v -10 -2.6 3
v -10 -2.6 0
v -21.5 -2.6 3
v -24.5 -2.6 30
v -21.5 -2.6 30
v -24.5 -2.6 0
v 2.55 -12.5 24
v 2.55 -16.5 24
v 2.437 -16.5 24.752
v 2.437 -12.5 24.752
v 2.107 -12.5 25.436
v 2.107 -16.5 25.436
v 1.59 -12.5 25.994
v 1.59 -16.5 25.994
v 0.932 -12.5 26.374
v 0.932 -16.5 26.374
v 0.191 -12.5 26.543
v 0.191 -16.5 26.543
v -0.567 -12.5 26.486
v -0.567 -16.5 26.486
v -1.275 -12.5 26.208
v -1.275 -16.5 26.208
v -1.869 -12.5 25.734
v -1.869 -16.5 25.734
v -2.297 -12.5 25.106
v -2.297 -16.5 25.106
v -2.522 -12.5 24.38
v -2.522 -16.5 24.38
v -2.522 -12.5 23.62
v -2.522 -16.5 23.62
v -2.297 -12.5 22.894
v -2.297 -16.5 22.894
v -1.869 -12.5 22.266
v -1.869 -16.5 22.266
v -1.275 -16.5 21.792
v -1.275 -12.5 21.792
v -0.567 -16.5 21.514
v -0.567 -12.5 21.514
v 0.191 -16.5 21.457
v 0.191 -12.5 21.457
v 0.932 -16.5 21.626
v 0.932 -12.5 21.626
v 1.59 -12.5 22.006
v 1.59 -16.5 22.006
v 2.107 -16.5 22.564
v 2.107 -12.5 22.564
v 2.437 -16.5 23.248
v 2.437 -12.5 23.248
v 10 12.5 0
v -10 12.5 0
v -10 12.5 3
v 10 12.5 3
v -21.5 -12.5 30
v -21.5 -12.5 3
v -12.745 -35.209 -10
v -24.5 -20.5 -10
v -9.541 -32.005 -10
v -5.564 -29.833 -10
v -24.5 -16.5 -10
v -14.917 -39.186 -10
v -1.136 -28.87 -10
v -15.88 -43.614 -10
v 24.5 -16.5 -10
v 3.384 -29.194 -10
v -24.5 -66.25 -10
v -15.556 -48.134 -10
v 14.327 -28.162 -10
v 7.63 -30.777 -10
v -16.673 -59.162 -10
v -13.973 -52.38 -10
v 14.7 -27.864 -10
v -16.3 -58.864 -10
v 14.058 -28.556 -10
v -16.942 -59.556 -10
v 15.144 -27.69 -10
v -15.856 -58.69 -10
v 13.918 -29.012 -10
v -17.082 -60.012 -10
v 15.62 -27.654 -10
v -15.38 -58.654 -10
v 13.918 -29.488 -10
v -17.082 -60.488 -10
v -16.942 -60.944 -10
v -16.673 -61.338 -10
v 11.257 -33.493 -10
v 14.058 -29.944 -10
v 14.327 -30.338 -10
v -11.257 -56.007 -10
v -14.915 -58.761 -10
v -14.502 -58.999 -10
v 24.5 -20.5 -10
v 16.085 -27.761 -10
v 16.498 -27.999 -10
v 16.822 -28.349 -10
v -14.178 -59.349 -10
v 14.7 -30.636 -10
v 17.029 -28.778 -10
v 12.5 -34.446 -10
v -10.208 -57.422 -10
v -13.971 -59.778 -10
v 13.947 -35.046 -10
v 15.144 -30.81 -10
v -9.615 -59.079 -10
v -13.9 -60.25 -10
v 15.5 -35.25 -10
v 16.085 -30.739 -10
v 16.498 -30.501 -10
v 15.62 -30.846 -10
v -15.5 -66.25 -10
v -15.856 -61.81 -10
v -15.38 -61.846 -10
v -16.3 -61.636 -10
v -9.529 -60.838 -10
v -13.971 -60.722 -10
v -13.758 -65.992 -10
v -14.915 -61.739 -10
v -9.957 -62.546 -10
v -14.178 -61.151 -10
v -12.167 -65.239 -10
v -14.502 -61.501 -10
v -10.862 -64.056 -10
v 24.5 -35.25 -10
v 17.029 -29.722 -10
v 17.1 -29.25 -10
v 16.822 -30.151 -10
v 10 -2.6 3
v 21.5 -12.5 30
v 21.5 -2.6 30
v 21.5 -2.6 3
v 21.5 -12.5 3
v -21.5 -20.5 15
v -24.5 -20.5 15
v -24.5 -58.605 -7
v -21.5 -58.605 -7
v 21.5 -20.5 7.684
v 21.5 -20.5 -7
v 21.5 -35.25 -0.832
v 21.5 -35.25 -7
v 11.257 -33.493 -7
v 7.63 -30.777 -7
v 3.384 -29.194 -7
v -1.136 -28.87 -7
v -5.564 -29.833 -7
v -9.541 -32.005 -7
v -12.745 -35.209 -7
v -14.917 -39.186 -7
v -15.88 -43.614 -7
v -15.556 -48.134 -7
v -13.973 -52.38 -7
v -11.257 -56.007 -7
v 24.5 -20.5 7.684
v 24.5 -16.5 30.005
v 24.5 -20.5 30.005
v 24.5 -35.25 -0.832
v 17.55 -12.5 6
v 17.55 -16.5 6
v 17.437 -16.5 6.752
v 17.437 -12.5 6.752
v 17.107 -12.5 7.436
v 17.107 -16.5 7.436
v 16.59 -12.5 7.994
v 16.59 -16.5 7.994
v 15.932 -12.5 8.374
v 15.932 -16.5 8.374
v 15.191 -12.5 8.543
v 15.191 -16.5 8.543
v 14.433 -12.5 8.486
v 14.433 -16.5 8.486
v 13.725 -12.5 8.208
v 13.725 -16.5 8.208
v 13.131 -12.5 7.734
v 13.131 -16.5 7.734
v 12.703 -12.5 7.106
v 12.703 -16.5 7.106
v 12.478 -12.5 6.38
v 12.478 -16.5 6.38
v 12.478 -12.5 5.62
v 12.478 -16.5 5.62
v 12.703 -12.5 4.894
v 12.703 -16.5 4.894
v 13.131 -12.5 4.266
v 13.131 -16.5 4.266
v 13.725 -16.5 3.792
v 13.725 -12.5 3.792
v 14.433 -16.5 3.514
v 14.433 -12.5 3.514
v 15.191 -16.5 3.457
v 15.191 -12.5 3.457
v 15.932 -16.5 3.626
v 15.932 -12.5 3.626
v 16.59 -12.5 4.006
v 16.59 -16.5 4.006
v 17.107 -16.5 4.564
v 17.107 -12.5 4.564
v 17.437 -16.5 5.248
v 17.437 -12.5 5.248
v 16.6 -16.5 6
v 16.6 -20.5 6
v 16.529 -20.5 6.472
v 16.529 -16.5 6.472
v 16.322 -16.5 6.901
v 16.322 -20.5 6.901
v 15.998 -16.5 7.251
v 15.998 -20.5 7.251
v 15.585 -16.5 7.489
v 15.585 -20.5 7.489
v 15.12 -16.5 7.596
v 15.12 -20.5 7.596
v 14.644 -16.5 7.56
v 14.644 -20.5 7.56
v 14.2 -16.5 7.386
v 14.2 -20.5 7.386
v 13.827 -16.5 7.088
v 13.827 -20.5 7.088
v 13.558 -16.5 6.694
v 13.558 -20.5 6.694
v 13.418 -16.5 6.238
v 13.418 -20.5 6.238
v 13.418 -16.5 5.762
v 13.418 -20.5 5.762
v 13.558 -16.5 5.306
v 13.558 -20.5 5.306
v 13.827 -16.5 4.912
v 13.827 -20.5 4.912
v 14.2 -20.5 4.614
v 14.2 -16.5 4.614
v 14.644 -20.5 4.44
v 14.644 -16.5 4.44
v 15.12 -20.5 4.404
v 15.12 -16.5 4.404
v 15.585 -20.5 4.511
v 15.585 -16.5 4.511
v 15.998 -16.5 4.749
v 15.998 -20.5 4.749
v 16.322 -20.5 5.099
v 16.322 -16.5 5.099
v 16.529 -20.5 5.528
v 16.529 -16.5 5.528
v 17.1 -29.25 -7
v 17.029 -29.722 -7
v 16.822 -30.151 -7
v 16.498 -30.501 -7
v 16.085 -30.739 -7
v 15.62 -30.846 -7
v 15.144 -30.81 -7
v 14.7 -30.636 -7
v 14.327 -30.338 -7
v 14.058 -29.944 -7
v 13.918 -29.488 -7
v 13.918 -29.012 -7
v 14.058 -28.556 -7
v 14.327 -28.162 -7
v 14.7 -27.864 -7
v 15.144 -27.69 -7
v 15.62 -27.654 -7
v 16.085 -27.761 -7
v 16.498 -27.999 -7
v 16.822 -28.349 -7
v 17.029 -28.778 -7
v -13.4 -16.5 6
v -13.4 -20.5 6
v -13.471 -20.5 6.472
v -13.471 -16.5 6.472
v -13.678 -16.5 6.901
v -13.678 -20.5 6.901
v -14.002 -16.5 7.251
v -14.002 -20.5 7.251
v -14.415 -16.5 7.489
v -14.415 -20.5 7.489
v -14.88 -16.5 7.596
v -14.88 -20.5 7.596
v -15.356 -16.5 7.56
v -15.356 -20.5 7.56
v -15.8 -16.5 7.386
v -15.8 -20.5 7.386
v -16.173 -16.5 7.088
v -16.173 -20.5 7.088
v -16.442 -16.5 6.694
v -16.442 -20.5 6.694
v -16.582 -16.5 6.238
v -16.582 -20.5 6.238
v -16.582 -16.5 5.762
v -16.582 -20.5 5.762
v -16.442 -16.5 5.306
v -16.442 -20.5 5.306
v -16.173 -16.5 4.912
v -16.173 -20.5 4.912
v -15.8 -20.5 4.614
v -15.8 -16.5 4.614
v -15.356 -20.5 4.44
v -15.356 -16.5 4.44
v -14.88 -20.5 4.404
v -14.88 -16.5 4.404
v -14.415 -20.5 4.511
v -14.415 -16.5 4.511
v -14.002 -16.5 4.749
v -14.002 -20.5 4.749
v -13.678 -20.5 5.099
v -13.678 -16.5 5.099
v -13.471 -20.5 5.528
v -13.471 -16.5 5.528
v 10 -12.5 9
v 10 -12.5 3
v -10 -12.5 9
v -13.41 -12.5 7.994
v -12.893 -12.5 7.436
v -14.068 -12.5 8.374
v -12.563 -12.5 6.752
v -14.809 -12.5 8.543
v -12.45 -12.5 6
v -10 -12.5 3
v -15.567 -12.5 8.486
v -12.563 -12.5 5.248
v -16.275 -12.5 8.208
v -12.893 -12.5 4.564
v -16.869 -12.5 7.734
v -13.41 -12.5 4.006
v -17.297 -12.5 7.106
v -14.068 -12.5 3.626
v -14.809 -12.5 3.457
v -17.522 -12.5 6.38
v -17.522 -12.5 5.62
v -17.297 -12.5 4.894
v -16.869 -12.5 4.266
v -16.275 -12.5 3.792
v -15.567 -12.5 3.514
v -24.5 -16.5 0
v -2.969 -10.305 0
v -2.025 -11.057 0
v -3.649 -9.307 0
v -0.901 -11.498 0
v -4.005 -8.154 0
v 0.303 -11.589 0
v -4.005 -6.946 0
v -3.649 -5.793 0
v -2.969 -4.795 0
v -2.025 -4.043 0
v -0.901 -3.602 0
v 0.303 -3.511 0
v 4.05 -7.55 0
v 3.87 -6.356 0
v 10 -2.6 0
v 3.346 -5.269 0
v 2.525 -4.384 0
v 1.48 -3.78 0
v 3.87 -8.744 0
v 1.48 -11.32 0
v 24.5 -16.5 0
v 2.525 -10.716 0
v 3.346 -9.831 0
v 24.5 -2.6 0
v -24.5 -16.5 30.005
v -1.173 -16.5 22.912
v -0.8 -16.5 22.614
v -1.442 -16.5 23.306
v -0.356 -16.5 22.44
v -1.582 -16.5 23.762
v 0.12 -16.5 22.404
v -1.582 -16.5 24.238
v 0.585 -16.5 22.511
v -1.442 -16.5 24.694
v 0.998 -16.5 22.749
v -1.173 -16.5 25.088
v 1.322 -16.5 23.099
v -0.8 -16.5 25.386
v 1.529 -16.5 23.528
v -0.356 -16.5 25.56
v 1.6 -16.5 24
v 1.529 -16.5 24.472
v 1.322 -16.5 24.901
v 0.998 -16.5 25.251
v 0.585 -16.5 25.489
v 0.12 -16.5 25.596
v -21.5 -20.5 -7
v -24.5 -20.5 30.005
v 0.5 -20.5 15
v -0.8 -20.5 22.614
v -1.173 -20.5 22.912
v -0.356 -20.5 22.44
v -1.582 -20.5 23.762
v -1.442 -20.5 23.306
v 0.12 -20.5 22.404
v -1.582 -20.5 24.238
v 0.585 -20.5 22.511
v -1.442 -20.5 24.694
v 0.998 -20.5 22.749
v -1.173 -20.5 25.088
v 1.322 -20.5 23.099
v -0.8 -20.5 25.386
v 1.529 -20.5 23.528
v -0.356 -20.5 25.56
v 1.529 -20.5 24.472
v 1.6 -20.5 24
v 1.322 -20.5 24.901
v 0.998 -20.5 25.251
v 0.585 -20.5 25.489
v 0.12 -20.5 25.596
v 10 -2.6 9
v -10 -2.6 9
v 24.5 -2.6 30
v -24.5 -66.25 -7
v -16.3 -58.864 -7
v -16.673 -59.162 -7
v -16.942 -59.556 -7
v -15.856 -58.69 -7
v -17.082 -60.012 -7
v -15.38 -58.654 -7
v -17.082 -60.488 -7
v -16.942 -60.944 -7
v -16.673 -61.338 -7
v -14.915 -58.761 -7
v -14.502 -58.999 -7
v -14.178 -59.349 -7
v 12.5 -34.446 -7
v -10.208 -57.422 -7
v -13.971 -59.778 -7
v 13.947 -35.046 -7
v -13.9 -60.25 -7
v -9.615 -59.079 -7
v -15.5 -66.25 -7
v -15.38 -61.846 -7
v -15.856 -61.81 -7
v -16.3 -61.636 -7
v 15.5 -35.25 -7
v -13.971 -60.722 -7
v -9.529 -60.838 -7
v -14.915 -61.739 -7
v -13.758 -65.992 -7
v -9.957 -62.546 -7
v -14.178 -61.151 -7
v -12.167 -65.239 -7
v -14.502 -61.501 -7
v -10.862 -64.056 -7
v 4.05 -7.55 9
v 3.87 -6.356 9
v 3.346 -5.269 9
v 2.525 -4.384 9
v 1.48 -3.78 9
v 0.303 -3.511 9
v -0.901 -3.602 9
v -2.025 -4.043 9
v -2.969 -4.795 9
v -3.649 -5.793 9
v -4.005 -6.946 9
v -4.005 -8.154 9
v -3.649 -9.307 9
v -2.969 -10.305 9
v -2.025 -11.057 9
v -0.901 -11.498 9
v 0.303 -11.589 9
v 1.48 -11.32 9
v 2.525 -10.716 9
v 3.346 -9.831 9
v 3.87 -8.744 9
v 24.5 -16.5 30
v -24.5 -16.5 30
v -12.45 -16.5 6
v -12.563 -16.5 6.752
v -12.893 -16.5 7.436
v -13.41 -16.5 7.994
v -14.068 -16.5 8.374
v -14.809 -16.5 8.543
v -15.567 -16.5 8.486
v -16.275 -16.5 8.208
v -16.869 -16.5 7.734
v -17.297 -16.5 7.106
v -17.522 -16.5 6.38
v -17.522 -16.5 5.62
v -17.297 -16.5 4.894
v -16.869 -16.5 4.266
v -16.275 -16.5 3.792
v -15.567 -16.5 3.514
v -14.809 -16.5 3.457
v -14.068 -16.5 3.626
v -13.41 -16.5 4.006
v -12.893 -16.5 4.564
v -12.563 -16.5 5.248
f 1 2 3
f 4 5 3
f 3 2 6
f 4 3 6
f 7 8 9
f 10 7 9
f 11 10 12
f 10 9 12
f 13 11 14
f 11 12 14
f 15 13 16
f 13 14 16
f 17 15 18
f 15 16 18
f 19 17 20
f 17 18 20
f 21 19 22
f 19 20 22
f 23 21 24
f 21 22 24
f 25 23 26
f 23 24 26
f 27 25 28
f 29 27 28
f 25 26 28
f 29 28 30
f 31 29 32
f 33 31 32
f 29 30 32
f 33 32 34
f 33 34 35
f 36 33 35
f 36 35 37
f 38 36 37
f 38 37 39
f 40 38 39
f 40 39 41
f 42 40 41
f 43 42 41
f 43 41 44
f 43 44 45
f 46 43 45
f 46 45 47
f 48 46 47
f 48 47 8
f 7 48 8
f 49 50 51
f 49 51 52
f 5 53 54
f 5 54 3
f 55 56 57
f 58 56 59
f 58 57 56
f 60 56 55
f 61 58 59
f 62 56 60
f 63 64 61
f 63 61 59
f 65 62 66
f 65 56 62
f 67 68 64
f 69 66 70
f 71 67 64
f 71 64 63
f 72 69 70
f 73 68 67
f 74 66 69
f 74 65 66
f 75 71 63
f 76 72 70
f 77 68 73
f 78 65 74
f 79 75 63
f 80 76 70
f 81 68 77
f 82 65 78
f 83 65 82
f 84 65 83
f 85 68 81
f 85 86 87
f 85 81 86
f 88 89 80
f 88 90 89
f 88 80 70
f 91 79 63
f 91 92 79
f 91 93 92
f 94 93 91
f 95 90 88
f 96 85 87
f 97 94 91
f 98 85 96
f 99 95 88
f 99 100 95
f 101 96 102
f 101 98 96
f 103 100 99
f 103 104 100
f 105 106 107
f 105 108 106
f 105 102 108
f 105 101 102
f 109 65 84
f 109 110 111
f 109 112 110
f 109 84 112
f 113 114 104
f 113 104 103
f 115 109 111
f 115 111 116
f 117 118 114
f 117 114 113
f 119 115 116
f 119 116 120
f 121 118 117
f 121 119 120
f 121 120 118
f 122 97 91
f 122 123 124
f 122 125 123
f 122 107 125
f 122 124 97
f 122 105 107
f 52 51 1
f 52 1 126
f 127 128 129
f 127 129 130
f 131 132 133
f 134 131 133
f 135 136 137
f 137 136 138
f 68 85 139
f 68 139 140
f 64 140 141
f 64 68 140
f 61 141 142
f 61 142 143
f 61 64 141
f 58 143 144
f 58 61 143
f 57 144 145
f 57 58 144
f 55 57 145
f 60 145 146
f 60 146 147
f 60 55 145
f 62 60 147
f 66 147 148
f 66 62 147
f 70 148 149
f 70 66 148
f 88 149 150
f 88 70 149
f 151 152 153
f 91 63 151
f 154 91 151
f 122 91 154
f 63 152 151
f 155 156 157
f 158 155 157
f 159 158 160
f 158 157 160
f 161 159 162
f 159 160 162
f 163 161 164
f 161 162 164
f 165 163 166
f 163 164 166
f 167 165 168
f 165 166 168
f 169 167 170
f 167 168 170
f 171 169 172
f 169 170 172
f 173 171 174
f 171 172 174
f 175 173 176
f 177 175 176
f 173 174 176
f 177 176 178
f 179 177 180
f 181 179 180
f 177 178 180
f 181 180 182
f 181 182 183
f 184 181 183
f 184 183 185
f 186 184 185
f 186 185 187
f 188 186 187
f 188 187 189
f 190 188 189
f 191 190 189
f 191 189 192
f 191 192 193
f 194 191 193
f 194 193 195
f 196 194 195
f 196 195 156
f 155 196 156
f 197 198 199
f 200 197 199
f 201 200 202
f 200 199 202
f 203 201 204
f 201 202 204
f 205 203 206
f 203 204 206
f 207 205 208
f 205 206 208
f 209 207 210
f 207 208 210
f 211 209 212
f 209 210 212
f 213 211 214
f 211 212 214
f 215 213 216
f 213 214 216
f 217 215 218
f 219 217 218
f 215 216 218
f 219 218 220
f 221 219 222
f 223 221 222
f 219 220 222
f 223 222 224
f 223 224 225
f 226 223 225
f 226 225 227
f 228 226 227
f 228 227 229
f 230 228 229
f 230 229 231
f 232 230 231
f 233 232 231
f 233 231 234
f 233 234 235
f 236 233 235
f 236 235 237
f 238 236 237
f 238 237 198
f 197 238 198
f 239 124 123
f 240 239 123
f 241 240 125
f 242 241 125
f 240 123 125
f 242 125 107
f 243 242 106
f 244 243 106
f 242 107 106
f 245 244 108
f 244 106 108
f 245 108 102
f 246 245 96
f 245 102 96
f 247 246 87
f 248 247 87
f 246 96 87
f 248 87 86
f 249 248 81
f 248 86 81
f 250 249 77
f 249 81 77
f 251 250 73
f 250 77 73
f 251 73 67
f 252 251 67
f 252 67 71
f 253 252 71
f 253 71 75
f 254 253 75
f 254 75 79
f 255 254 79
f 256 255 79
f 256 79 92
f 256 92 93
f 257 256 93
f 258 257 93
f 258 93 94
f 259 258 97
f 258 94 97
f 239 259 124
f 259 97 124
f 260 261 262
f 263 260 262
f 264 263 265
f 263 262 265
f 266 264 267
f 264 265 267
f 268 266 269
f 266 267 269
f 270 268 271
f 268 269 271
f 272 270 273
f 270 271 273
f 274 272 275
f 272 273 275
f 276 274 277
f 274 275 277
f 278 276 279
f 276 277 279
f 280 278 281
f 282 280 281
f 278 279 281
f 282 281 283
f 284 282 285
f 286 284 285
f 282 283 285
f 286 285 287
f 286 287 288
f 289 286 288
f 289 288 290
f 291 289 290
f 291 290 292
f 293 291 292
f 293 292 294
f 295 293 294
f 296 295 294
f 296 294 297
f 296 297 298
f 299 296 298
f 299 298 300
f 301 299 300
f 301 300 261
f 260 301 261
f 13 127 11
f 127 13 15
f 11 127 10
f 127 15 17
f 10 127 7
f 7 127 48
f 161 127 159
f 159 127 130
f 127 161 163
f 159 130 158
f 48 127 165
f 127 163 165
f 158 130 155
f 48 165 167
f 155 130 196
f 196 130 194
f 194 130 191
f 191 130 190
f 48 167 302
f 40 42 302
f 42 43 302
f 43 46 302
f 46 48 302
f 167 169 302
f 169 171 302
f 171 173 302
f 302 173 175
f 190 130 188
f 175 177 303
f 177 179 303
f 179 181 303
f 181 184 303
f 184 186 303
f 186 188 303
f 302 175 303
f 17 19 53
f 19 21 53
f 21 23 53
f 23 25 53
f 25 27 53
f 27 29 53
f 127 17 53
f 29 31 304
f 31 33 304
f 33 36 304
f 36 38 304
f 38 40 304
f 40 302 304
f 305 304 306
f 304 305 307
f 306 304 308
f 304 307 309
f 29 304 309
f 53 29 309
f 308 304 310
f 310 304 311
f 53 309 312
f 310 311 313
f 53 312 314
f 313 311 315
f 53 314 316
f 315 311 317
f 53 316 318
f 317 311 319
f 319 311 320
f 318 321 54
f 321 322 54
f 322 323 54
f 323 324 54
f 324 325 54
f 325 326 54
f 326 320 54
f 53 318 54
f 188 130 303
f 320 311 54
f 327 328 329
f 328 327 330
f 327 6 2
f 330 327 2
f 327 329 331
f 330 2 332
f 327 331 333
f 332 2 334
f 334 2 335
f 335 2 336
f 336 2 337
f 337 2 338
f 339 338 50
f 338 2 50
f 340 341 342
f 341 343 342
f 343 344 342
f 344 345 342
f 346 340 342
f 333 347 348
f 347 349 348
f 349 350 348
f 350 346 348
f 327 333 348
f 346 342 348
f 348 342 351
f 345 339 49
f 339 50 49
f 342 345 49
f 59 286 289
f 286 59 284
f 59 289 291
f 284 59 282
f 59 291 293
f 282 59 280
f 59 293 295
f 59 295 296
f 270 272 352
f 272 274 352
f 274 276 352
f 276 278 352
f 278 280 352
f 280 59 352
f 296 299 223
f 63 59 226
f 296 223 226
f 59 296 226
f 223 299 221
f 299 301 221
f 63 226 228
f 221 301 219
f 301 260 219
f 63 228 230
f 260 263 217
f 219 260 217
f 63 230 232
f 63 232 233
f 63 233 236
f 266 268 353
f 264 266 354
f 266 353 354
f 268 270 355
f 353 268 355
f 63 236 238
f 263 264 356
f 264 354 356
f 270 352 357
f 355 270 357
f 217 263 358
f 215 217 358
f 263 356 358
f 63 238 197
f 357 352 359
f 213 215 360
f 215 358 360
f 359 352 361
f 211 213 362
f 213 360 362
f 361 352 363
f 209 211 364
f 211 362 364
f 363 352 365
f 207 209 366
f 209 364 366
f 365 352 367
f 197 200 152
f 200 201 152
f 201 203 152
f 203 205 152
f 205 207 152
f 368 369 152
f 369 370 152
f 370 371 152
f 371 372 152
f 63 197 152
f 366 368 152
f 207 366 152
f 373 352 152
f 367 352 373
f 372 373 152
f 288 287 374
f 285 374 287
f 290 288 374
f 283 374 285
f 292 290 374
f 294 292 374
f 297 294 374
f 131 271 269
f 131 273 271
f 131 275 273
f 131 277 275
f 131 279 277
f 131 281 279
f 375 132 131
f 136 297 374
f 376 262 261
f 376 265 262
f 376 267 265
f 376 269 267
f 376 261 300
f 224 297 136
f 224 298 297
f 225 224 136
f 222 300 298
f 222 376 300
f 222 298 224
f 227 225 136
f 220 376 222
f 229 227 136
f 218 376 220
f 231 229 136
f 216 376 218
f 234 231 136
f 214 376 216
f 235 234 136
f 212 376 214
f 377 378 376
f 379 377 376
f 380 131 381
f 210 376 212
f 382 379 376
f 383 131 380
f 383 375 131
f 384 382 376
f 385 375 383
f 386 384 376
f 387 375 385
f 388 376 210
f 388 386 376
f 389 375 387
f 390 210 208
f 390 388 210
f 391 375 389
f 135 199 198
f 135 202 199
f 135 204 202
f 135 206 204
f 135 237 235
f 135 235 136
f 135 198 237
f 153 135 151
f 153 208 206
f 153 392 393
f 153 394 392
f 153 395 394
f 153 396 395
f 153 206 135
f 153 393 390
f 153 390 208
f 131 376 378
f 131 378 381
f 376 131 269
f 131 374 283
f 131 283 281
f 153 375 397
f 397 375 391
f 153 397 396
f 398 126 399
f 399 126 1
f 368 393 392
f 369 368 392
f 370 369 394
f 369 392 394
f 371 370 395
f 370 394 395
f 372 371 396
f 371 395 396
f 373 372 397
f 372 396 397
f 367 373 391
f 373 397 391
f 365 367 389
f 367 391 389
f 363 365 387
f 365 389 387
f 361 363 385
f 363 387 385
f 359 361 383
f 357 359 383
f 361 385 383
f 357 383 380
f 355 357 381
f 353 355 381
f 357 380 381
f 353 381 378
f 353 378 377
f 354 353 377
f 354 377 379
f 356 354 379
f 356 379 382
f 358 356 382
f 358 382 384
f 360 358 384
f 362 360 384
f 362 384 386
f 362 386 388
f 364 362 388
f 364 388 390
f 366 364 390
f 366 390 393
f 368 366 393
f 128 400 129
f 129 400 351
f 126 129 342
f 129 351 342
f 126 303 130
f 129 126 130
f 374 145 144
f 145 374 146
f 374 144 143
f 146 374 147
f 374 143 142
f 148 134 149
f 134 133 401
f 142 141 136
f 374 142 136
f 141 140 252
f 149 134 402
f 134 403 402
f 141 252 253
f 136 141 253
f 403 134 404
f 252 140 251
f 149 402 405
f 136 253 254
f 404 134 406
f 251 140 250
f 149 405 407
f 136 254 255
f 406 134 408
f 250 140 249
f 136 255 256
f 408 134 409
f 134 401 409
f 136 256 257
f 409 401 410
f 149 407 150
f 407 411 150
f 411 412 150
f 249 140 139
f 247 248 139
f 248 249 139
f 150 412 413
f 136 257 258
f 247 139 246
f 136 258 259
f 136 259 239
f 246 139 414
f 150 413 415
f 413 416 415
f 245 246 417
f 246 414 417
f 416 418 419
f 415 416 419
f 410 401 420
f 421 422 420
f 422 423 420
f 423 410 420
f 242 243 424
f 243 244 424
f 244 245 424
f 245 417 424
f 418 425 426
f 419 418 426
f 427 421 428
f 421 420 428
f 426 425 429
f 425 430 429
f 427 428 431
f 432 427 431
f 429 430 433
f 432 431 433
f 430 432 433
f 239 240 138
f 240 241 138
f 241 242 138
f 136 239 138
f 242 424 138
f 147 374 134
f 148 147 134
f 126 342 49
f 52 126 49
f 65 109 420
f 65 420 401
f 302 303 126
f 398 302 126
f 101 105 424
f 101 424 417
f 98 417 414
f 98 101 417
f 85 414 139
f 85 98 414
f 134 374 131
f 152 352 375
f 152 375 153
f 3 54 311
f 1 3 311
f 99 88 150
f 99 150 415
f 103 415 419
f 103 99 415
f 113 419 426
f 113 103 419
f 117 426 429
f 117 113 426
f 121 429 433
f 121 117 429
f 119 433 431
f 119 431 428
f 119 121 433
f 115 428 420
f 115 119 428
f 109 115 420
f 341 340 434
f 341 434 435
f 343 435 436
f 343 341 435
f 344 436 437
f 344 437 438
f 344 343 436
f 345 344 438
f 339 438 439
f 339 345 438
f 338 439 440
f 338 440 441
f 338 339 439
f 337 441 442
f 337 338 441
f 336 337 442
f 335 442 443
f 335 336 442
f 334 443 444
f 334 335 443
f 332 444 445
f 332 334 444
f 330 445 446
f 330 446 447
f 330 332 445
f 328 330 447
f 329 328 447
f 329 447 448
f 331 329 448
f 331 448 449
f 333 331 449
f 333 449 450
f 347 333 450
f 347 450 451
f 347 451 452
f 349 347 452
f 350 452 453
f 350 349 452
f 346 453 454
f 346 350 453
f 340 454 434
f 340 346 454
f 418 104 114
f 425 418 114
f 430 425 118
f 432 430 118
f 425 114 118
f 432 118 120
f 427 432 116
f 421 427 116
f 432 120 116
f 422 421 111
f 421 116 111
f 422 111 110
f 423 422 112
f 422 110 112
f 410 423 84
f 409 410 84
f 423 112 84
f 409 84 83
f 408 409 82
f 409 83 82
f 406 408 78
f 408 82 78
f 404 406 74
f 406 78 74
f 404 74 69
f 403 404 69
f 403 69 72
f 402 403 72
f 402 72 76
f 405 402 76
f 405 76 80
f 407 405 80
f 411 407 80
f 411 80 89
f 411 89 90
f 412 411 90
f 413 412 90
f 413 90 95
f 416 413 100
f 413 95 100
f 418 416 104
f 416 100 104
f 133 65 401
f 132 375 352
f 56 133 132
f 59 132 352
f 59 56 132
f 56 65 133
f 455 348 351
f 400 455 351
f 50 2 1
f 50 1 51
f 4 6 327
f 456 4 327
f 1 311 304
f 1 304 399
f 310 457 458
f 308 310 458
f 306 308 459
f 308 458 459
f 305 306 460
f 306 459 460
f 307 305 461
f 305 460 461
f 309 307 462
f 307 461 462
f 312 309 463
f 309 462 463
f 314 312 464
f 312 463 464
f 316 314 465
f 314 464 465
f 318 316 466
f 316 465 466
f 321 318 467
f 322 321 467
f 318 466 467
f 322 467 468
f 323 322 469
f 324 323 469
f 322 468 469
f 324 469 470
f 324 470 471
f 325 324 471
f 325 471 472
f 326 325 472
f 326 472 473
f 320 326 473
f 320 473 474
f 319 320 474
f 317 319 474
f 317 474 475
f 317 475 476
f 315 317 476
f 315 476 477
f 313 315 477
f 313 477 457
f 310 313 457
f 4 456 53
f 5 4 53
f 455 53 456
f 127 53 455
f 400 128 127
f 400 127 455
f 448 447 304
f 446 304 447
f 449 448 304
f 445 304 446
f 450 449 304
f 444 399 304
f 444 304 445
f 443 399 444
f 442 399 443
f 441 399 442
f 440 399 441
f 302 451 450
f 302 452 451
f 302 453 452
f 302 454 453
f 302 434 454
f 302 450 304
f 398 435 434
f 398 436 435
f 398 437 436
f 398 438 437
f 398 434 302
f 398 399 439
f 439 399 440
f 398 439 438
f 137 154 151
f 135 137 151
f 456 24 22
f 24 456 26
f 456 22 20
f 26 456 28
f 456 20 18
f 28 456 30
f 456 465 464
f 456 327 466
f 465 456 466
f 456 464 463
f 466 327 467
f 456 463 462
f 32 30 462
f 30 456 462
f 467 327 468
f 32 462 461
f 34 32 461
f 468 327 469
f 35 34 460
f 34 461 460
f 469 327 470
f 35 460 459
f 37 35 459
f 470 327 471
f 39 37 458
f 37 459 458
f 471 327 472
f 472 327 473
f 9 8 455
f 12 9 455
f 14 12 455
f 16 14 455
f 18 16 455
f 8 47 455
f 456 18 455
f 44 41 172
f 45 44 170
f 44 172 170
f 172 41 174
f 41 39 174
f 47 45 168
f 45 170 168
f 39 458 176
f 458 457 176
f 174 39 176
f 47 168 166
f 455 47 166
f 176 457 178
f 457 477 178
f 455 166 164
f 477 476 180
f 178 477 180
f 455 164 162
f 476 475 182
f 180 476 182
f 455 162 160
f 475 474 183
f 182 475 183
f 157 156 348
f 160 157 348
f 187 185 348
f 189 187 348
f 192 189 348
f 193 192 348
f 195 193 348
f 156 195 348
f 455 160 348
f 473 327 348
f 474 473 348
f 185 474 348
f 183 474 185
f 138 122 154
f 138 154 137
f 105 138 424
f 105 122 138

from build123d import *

# Parameters (mm, degrees)
F0_W      = 20
F0_H      = 25
F1_DEPTH  = 3
F3_DEPTH  = 9
F5_DEPTH  = 30
F6_W      = 49
F6_H      = 13.9
F7_DEPTH  = 3
F8_R      = 4.05
F9_DEPTH  = 9
F10_R     = 2.55
F11_DEPTH = 25
F12_W     = 49
F12_H     = 40.0050412431
F13_DEPTH = 4
F14_R     = 1.6
F15_DEPTH = 33.001
F16_R     = 1.6
F17_DEPTH = 3
F18_W     = 3
F18_H     = 14.75
F18_H_2   = 45.75
F19_DEPTH = 25
F21_DEPTH = 3
F23_DEPTH = 25


with BuildPart() as f1:
    # F0 (on Top) → F1 (new body)
    with BuildSketch(Plane.XY):
        Rectangle(F0_W, F0_H)
    extrude(amount=F1_DEPTH)

    # F2 (on Top) → F3 (join)
    with BuildSketch(Plane.XY):
        Polygon((10, -2.6), (-10, -2.6), (-10, -6.8), (-10, -12.5), (10, -12.5), (10, -7.5), align=None)
    extrude(amount=F3_DEPTH)

    # F4 (on face) → F5 (join)
    with BuildSketch(Plane.XY):
        Polygon((-21.5, -2.6), (-24.5, -2.6), (-24.5, -16.5), (24.5, -16.5), (24.5, -2.6), (21.5, -2.6), (21.5, -12.5), (-21.5, -12.5), align=None)
    extrude(amount=F5_DEPTH)

    # F6 (on face) → F7 (join)
    with BuildSketch(Plane(origin=(0, 0, 0), x_dir=(1, 0, 0), z_dir=(0, 0, -1))):
        with Locations((0, 9.55)):
            Rectangle(F6_W, F6_H)
    extrude(amount=-F7_DEPTH)

    # F8 (on Top) → F9 (cut, through all)
    with BuildSketch(Plane.XY):
        with Locations((0, -7.55)):
            Circle(F8_R)
    extrude(amount=F9_DEPTH, mode=Mode.SUBTRACT)

    # F10 (on face) → F11 (cut)
    with BuildSketch(Plane.XZ.offset(16.5)):
        with Locations((15, 6)):
            Circle(F10_R)
        with Locations((-15, 6)):
            Circle(F10_R)
        with Locations((0, 24)):
            Circle(F10_R)
    extrude(amount=-F11_DEPTH, mode=Mode.SUBTRACT)


with BuildPart() as f13:
    # F12 (on face) → F13 (new body)
    with BuildSketch(Plane.XZ.offset(16.5)):
        with Locations((0, 10.0025206215)):
            Rectangle(F12_W, F12_H)
    extrude(amount=F13_DEPTH)

    # F14 (on face) → F15 (cut, through all)
    with BuildSketch(Plane.XZ.offset(20.5)):
        with Locations((-15, 6)):
            Circle(F14_R)
        with Locations((0, 24)):
            Circle(F14_R)
        with Locations((15, 6)):
            Circle(F14_R)
    extrude(amount=-F15_DEPTH, mode=Mode.SUBTRACT)

    # F16 (on face) → F17 (join)
    with BuildSketch(Plane(origin=(0, 0, -10), x_dir=(1, 0, 0), z_dir=(0, 0, -1))):
        with BuildLine():
            ThreePointArc((11.2573593129, 33.4926406871), (-11.2573593129, 33.4926406871), (-11.2573593129, 56.0073593129))
            ThreePointArc((-11.2573593129, 56.0073593129), (-9.9567228049, 62.5461005942), (-15.5, 66.25))
            Line((-15.5, 66.25), (-24.5, 66.25))
            Line((-24.5, 66.25), (-24.5, 20.5))
            Line((-24.5, 20.5), (24.5, 20.5))
            Line((24.5, 20.5), (24.5, 35.25))
            Line((24.5, 35.25), (15.5, 35.25))
            ThreePointArc((15.5, 35.25), (13.2038994058, 34.7932771951), (11.2573593129, 33.4926406871))
        make_face()
        with Locations((15.5, 29.25)):
            Circle(F16_R, mode=Mode.SUBTRACT)
        with Locations((-15.5, 60.25)):
            Circle(F16_R, mode=Mode.SUBTRACT)
    extrude(amount=-F17_DEPTH)

    # F18 (on face) → F19 (join)
    with BuildSketch(Plane(origin=(0, 0, -10), x_dir=(1, 0, 0), z_dir=(0, 0, -1))):
        with Locations((23, 27.875)):
            Rectangle(F18_W, F18_H)
        with Locations((-23, 43.375)):
            Rectangle(F18_W, F18_H_2)
    extrude(amount=-F19_DEPTH)

    # F20 (on face) → F21 (cut, through all)
    with BuildSketch(Plane.YZ.offset(24.5)):
        Polygon((-20.5, 15), (-35.25, 15), (-35.25, -0.8318844145), (-20.5, 7.6840320561), align=None)
    extrude(amount=-F21_DEPTH, mode=Mode.SUBTRACT)

    # F22 (on face) → F23 (cut)
    with BuildSketch(Plane(origin=(-24.5, 0, 0), x_dir=(0, -1, 0), z_dir=(-1, 0, 0))):
        Polygon((66.25, 15), (20.5, 15), (58.6051177665, -7), (66.25, -7), align=None)
    extrude(amount=-F23_DEPTH, mode=Mode.SUBTRACT)


solid = Compound([f1.part, f13.part])
